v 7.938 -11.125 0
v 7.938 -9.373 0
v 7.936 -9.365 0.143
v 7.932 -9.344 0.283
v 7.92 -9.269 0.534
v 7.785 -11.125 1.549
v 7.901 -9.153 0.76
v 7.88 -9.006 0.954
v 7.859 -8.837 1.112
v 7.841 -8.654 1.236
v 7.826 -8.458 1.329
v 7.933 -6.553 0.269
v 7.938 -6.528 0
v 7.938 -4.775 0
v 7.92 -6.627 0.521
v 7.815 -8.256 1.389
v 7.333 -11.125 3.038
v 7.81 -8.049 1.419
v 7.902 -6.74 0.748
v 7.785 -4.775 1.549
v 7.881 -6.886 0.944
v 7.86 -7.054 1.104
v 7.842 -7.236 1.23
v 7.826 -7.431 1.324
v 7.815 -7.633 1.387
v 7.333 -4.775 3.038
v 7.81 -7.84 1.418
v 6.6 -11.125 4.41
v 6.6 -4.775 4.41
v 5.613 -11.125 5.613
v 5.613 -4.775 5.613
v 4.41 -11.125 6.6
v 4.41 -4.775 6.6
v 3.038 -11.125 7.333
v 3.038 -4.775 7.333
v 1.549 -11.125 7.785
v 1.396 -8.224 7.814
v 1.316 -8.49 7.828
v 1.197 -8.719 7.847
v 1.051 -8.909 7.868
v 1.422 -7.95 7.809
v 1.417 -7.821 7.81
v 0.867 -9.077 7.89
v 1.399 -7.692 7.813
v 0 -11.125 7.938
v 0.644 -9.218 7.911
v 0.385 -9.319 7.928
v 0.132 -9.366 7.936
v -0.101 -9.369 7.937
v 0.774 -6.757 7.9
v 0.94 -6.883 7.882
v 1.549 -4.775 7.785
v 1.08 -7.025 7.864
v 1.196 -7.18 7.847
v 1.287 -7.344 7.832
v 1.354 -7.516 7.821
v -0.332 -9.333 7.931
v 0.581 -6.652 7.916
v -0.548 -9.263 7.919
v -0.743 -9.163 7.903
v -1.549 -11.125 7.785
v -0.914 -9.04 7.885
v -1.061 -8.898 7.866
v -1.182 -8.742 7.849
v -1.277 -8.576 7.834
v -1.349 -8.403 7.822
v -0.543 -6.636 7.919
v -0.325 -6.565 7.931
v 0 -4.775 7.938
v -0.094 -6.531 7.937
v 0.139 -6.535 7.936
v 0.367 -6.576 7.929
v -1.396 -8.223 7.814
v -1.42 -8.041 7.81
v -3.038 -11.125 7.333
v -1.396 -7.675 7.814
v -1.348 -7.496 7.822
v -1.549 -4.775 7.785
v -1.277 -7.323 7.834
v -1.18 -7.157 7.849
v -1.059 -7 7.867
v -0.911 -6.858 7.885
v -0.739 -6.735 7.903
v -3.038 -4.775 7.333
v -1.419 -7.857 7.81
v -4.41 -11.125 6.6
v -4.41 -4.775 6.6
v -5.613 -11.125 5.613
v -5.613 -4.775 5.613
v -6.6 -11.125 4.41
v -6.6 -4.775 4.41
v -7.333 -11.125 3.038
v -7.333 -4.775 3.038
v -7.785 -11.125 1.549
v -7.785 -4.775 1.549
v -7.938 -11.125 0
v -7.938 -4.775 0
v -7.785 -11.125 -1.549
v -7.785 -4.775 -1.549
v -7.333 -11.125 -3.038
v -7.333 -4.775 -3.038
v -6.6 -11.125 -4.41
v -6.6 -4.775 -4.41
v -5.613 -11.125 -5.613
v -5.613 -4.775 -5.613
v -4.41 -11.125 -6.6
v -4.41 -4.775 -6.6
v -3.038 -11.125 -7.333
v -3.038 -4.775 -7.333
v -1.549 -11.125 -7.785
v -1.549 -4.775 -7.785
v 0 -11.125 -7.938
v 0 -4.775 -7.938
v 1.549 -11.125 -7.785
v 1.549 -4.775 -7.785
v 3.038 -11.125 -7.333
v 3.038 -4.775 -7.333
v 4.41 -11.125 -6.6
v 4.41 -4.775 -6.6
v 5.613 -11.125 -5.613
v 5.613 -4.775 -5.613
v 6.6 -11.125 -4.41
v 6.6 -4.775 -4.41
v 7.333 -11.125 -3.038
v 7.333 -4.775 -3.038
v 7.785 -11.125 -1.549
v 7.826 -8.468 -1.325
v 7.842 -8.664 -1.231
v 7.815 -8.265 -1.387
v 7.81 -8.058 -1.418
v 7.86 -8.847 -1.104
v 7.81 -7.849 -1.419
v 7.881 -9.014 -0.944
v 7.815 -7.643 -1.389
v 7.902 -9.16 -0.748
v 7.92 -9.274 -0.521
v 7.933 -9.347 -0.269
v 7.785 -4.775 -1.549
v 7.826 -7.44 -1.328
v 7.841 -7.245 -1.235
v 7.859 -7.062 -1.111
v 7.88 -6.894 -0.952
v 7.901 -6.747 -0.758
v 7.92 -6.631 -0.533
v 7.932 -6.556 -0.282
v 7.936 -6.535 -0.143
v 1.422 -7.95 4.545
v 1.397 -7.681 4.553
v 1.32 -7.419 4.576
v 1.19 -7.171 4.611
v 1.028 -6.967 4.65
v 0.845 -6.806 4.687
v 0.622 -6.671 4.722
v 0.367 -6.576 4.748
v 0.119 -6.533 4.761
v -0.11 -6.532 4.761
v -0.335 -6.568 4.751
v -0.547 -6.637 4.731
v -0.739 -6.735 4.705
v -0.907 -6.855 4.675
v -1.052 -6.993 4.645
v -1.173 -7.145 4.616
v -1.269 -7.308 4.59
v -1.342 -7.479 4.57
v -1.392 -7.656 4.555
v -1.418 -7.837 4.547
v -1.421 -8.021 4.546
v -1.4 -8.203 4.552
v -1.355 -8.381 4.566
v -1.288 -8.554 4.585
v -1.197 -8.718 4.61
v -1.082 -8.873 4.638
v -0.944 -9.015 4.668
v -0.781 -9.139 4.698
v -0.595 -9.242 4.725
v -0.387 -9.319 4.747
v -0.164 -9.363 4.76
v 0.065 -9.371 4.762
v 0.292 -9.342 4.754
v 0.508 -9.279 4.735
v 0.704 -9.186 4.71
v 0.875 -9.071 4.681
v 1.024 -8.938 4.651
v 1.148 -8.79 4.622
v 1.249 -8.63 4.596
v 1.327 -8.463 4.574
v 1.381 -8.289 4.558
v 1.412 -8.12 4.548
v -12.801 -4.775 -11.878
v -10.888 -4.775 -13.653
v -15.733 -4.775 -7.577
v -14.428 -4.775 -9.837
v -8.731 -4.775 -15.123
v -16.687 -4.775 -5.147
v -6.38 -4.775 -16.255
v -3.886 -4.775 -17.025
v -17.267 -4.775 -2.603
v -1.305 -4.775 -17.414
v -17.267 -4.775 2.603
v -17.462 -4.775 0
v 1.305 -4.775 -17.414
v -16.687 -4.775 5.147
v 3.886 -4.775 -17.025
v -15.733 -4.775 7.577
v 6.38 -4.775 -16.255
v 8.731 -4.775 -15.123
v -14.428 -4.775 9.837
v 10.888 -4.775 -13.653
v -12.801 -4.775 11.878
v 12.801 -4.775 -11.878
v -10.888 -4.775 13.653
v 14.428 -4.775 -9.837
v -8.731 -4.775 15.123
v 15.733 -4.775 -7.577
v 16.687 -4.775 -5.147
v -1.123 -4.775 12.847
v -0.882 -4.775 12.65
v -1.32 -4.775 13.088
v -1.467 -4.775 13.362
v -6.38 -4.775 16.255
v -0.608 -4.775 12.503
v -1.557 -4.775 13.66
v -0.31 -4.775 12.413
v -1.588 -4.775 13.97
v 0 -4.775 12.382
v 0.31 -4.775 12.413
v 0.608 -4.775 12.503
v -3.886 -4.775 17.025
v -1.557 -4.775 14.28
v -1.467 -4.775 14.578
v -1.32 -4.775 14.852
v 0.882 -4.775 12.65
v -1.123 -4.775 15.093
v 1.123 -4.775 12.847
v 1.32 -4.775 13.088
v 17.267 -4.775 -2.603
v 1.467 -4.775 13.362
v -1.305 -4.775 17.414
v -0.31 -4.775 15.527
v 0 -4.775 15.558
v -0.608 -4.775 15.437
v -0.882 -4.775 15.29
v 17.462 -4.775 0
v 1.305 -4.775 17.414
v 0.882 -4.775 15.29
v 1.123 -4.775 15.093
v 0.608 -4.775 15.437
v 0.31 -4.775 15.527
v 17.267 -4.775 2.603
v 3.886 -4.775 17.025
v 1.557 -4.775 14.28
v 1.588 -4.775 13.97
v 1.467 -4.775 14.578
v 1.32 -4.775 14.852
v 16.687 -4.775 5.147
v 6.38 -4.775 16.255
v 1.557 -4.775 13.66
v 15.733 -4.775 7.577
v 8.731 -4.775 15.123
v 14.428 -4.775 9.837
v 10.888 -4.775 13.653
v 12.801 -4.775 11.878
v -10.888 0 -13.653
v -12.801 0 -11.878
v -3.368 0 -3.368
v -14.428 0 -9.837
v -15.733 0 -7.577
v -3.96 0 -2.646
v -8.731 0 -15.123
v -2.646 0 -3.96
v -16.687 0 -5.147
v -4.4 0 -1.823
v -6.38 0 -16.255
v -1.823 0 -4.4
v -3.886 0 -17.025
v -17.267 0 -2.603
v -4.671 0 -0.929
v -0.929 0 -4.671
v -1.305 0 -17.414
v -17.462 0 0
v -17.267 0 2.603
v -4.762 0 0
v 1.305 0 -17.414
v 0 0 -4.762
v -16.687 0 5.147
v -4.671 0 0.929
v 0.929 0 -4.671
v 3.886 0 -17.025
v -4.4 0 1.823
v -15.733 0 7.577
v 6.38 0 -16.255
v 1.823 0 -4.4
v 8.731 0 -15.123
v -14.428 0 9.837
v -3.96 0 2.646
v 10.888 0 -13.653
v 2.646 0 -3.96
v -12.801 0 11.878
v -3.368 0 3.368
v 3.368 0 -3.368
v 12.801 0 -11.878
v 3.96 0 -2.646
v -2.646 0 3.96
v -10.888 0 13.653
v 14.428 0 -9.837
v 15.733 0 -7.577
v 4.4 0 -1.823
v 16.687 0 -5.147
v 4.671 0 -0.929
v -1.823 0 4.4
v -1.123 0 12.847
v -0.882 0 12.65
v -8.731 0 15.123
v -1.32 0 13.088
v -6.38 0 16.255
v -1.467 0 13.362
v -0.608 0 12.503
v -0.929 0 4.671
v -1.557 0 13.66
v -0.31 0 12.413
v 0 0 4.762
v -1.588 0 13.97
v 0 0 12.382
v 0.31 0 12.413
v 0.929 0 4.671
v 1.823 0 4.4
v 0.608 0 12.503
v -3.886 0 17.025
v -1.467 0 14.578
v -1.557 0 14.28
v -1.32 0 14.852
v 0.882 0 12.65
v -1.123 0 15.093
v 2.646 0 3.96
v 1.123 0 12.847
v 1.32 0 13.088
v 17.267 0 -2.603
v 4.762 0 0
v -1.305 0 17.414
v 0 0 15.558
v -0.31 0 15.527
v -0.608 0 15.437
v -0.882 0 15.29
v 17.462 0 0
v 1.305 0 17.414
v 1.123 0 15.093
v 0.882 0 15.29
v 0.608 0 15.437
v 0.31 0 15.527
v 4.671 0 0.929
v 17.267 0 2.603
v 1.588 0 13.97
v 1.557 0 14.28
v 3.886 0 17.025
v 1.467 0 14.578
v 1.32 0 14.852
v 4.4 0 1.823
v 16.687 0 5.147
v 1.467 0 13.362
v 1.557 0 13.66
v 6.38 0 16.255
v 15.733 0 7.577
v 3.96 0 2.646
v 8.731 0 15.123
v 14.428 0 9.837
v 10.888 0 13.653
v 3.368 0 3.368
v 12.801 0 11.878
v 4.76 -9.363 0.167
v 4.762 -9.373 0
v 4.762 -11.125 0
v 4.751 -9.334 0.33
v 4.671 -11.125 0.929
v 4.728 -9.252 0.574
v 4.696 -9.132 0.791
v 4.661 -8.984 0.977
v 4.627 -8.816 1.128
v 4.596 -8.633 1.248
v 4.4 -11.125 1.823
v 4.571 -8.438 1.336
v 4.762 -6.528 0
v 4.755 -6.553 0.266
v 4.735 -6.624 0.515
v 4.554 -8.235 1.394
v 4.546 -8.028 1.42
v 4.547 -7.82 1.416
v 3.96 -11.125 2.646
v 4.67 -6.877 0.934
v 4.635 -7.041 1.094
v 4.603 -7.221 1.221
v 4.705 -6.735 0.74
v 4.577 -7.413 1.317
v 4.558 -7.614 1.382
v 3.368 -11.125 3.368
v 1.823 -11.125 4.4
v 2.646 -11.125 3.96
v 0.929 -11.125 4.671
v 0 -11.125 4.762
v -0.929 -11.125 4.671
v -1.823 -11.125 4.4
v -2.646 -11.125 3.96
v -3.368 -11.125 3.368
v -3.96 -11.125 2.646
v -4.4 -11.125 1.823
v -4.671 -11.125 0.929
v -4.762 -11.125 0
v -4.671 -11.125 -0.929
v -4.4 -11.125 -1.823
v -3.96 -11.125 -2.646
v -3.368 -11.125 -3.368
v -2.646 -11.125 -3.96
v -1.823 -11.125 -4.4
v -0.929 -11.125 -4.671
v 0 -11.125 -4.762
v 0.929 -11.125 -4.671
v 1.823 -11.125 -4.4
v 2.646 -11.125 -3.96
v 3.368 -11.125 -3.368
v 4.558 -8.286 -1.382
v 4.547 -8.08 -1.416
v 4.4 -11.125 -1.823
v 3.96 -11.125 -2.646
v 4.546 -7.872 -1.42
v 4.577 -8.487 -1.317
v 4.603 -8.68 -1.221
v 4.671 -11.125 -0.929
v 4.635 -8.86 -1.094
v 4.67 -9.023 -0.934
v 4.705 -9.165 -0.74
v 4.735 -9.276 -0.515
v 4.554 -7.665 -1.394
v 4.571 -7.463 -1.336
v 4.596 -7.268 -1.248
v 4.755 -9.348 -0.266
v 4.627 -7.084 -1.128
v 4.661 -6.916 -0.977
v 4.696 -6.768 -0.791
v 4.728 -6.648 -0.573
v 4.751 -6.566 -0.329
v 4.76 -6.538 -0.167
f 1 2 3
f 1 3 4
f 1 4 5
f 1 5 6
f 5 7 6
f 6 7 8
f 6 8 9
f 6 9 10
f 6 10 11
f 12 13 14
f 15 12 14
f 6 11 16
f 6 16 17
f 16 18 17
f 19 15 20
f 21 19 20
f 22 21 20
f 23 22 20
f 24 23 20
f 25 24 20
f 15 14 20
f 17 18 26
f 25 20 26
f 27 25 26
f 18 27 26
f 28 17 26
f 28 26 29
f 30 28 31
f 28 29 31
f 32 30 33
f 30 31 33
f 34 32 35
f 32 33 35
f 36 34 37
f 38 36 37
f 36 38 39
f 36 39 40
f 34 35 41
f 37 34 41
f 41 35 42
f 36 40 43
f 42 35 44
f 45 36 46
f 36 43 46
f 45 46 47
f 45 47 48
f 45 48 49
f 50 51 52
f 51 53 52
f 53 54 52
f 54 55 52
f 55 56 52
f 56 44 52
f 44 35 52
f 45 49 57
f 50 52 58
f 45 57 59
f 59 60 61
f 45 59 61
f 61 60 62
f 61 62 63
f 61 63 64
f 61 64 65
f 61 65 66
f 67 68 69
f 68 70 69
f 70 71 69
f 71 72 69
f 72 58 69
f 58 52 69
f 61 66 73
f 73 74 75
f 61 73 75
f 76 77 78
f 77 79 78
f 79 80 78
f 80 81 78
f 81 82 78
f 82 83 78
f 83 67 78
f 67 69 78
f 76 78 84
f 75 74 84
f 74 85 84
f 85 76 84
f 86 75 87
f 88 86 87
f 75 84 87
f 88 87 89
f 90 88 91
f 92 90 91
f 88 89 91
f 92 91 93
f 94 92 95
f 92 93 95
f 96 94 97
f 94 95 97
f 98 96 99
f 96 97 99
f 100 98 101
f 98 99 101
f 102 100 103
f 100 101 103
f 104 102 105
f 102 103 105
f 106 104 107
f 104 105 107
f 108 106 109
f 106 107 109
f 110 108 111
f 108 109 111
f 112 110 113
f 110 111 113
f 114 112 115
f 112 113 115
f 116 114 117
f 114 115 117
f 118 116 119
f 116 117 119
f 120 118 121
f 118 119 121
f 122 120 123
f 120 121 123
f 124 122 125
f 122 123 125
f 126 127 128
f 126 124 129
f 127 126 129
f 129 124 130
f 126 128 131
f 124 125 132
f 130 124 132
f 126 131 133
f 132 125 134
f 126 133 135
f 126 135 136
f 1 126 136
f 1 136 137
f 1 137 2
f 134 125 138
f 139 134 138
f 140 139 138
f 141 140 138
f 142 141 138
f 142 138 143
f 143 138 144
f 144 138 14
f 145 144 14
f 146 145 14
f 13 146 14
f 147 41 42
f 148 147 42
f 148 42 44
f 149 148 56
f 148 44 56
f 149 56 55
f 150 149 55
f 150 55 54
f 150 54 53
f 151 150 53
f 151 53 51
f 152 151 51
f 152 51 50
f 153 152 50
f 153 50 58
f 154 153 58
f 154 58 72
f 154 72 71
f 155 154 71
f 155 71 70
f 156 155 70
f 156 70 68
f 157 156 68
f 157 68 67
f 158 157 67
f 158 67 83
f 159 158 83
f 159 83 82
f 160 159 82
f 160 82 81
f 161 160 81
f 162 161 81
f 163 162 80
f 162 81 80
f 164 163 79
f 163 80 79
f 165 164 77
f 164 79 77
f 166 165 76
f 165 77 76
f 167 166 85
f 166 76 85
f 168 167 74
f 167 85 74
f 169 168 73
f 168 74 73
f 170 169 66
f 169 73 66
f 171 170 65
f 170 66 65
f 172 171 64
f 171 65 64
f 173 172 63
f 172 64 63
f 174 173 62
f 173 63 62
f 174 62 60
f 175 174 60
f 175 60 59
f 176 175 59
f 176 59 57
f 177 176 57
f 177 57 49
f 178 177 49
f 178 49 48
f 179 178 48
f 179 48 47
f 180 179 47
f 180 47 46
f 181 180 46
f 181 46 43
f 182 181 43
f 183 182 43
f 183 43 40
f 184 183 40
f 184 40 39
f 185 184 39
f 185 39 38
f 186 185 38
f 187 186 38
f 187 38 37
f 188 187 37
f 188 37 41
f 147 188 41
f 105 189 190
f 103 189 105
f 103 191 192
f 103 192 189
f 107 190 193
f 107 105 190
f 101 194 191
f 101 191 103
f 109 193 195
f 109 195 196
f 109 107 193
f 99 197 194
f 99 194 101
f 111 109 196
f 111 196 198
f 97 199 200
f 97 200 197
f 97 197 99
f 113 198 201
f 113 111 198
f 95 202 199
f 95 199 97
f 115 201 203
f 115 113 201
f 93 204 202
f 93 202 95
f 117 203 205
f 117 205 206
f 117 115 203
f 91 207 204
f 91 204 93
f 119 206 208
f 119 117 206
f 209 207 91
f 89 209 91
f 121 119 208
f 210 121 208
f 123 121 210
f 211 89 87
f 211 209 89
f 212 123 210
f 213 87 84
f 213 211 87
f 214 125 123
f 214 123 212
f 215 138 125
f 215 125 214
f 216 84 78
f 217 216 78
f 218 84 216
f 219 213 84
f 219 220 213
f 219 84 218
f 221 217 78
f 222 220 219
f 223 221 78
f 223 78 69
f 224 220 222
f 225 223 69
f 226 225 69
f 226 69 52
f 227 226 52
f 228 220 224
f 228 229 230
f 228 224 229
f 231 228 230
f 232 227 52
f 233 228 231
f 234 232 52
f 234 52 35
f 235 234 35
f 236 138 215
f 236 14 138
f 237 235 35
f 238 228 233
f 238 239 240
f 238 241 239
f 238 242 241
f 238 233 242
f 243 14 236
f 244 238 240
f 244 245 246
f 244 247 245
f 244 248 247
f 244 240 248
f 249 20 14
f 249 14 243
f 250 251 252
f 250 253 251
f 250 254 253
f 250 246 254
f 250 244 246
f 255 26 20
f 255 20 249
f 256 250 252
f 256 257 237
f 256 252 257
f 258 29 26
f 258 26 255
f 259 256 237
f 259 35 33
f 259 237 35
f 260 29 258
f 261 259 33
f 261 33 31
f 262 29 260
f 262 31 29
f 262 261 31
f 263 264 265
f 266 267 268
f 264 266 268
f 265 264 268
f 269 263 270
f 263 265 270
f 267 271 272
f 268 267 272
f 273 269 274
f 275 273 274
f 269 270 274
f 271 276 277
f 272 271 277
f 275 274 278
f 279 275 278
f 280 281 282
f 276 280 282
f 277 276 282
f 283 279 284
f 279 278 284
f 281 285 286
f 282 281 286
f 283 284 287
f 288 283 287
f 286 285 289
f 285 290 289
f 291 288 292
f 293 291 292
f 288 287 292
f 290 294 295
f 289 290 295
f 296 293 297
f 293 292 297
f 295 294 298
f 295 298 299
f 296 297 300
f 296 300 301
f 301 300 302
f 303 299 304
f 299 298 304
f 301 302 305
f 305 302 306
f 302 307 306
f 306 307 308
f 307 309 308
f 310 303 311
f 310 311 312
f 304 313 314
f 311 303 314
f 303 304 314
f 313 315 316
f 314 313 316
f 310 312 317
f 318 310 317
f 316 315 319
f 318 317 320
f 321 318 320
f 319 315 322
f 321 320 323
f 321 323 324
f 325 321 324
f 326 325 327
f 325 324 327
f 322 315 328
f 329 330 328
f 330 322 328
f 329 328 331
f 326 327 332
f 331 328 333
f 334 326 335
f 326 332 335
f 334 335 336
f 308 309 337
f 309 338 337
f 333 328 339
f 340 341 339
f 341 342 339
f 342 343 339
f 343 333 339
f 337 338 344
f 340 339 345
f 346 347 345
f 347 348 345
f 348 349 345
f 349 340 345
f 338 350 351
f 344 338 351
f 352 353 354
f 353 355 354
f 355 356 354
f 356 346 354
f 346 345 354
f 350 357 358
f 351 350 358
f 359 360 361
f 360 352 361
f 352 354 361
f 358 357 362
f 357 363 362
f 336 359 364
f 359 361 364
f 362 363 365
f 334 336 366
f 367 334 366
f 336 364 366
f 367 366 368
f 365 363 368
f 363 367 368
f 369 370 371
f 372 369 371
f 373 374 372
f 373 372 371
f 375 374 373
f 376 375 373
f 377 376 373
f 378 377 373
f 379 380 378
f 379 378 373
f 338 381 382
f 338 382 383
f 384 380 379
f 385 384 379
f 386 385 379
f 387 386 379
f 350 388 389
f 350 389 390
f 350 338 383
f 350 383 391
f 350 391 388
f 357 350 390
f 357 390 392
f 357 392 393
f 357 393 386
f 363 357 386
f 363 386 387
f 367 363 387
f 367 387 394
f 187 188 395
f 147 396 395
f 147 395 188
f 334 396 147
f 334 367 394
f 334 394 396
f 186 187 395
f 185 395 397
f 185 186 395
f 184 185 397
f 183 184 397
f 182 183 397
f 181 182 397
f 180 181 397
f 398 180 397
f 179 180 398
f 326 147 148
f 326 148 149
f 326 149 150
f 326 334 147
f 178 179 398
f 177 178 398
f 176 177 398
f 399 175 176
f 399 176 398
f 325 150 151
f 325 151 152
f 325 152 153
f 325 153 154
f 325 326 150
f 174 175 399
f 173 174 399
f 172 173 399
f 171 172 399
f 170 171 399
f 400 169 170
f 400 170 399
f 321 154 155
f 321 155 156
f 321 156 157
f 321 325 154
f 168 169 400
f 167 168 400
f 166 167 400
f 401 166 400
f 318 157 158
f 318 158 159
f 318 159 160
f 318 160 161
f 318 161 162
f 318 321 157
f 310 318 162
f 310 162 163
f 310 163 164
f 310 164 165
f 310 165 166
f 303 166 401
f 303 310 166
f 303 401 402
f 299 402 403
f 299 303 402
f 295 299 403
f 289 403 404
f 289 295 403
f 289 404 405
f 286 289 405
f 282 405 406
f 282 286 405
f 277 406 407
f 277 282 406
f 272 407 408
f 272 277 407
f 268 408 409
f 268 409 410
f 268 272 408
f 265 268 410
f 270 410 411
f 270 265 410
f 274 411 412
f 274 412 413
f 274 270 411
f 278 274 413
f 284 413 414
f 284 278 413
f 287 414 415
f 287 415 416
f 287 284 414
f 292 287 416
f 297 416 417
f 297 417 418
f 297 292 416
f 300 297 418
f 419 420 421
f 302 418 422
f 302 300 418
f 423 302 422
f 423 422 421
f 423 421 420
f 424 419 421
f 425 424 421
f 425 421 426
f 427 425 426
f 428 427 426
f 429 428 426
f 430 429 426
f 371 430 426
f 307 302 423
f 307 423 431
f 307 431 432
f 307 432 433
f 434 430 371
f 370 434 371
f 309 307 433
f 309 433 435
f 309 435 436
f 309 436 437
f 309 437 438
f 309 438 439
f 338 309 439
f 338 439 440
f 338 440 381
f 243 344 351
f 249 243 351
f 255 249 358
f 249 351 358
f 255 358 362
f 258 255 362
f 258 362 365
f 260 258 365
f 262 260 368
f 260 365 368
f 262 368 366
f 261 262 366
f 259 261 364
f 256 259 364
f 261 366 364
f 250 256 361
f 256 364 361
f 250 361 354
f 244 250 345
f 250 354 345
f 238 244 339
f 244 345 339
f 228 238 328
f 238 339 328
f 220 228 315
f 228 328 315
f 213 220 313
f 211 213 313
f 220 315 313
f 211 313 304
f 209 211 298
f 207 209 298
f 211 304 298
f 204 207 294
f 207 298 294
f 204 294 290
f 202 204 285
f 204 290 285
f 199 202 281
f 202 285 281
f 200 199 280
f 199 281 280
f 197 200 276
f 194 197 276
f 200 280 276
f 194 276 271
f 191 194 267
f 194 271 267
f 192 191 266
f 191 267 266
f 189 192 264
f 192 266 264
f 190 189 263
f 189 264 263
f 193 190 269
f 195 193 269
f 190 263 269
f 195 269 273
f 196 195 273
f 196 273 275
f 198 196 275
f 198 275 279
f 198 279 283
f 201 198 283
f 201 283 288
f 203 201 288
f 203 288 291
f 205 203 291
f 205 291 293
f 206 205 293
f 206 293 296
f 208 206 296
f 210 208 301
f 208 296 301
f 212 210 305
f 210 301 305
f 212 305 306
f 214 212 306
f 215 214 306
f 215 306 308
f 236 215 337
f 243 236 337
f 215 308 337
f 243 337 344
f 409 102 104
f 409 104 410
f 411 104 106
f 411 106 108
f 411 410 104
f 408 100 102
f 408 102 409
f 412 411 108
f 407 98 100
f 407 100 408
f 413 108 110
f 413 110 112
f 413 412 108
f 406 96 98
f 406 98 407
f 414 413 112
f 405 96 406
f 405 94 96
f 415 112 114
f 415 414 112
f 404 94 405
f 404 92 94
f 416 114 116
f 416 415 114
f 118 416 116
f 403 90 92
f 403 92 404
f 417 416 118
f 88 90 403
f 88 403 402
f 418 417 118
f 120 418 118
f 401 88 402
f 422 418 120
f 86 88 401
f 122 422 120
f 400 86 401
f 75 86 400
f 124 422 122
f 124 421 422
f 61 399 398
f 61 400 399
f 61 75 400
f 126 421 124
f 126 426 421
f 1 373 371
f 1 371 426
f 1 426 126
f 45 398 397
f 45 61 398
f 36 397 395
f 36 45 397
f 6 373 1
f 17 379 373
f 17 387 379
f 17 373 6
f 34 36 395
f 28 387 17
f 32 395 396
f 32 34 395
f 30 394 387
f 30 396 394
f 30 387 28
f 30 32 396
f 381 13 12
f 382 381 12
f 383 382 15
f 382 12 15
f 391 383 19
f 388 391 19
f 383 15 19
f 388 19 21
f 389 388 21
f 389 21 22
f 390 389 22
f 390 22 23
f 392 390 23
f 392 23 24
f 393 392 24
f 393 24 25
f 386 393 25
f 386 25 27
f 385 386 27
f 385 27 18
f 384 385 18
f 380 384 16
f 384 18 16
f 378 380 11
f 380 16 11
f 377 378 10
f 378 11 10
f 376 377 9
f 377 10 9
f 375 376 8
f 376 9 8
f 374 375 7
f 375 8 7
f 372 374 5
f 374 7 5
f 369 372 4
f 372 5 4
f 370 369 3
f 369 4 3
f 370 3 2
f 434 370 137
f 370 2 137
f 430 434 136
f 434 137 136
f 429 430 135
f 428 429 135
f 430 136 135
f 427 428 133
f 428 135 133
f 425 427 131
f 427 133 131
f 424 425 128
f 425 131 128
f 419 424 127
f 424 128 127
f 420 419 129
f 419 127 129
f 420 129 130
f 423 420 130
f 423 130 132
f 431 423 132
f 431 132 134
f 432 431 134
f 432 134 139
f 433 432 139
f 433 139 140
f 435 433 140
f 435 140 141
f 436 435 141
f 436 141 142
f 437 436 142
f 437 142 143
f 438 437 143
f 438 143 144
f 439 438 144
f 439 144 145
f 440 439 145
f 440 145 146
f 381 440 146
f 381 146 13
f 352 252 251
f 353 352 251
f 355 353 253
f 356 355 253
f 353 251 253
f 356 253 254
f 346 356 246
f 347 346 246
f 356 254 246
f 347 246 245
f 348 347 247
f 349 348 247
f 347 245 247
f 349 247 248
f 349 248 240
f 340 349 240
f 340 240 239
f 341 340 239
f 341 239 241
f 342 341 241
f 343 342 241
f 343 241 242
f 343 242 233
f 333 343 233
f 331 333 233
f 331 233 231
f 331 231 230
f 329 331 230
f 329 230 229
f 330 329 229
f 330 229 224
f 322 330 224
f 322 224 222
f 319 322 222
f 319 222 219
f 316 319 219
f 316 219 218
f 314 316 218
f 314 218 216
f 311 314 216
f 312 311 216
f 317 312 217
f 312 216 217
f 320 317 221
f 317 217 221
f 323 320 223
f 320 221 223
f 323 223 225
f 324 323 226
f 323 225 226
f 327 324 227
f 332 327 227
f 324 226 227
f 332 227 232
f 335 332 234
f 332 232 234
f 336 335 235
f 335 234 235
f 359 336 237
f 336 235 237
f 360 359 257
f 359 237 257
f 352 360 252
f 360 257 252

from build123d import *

# Parameters (mm, degrees)
F0_R      = 17.4625
F0_R_2    = 4.7625
F1_DEPTH  = 4.7752
F2_R      = 7.9375
F2_R_2    = 4.7625
F3_DEPTH  = 6.35
F5_R      = 1.5875
F6_DEPTH  = 4.7762
F8_R      = 1.4224
F9_DEPTH  = 5.08
F11_R     = 1.4224
F12_DEPTH = 5.08


with BuildPart() as f1:
    # F0 (on Front) → F1 (new body)
    with BuildSketch(Plane.XZ):
        Circle(F0_R)
        Circle(F0_R_2, mode=Mode.SUBTRACT)
    extrude(amount=F1_DEPTH)

    # F2 (on face) → F3 (join)
    with BuildSketch(Plane.XZ.offset(4.7752)):
        Circle(F2_R)
        Circle(F2_R_2, mode=Mode.SUBTRACT)
    extrude(amount=F3_DEPTH)

    # F5 (on face) → F6 (cut, through all)
    with BuildSketch(Plane.XZ.offset(4.7752)):
        with Locations((0, 13.97)):
            Circle(F5_R)
    extrude(amount=-F6_DEPTH, mode=Mode.SUBTRACT)

    # F8 (on offset) → F9 (cut)
    with BuildSketch(Plane.XY.offset(7.9375)):
        with Locations((0, -7.9502)):
            Circle(F8_R)
    extrude(amount=-F9_DEPTH, mode=Mode.SUBTRACT)

    # F11 (on offset) → F12 (cut)
    with BuildSketch(Plane.YZ.offset(7.9375)):
        with Locations((-7.9502, 0)):
            Circle(F11_R)
    extrude(amount=-F12_DEPTH, mode=Mode.SUBTRACT)


solid = f1.part
